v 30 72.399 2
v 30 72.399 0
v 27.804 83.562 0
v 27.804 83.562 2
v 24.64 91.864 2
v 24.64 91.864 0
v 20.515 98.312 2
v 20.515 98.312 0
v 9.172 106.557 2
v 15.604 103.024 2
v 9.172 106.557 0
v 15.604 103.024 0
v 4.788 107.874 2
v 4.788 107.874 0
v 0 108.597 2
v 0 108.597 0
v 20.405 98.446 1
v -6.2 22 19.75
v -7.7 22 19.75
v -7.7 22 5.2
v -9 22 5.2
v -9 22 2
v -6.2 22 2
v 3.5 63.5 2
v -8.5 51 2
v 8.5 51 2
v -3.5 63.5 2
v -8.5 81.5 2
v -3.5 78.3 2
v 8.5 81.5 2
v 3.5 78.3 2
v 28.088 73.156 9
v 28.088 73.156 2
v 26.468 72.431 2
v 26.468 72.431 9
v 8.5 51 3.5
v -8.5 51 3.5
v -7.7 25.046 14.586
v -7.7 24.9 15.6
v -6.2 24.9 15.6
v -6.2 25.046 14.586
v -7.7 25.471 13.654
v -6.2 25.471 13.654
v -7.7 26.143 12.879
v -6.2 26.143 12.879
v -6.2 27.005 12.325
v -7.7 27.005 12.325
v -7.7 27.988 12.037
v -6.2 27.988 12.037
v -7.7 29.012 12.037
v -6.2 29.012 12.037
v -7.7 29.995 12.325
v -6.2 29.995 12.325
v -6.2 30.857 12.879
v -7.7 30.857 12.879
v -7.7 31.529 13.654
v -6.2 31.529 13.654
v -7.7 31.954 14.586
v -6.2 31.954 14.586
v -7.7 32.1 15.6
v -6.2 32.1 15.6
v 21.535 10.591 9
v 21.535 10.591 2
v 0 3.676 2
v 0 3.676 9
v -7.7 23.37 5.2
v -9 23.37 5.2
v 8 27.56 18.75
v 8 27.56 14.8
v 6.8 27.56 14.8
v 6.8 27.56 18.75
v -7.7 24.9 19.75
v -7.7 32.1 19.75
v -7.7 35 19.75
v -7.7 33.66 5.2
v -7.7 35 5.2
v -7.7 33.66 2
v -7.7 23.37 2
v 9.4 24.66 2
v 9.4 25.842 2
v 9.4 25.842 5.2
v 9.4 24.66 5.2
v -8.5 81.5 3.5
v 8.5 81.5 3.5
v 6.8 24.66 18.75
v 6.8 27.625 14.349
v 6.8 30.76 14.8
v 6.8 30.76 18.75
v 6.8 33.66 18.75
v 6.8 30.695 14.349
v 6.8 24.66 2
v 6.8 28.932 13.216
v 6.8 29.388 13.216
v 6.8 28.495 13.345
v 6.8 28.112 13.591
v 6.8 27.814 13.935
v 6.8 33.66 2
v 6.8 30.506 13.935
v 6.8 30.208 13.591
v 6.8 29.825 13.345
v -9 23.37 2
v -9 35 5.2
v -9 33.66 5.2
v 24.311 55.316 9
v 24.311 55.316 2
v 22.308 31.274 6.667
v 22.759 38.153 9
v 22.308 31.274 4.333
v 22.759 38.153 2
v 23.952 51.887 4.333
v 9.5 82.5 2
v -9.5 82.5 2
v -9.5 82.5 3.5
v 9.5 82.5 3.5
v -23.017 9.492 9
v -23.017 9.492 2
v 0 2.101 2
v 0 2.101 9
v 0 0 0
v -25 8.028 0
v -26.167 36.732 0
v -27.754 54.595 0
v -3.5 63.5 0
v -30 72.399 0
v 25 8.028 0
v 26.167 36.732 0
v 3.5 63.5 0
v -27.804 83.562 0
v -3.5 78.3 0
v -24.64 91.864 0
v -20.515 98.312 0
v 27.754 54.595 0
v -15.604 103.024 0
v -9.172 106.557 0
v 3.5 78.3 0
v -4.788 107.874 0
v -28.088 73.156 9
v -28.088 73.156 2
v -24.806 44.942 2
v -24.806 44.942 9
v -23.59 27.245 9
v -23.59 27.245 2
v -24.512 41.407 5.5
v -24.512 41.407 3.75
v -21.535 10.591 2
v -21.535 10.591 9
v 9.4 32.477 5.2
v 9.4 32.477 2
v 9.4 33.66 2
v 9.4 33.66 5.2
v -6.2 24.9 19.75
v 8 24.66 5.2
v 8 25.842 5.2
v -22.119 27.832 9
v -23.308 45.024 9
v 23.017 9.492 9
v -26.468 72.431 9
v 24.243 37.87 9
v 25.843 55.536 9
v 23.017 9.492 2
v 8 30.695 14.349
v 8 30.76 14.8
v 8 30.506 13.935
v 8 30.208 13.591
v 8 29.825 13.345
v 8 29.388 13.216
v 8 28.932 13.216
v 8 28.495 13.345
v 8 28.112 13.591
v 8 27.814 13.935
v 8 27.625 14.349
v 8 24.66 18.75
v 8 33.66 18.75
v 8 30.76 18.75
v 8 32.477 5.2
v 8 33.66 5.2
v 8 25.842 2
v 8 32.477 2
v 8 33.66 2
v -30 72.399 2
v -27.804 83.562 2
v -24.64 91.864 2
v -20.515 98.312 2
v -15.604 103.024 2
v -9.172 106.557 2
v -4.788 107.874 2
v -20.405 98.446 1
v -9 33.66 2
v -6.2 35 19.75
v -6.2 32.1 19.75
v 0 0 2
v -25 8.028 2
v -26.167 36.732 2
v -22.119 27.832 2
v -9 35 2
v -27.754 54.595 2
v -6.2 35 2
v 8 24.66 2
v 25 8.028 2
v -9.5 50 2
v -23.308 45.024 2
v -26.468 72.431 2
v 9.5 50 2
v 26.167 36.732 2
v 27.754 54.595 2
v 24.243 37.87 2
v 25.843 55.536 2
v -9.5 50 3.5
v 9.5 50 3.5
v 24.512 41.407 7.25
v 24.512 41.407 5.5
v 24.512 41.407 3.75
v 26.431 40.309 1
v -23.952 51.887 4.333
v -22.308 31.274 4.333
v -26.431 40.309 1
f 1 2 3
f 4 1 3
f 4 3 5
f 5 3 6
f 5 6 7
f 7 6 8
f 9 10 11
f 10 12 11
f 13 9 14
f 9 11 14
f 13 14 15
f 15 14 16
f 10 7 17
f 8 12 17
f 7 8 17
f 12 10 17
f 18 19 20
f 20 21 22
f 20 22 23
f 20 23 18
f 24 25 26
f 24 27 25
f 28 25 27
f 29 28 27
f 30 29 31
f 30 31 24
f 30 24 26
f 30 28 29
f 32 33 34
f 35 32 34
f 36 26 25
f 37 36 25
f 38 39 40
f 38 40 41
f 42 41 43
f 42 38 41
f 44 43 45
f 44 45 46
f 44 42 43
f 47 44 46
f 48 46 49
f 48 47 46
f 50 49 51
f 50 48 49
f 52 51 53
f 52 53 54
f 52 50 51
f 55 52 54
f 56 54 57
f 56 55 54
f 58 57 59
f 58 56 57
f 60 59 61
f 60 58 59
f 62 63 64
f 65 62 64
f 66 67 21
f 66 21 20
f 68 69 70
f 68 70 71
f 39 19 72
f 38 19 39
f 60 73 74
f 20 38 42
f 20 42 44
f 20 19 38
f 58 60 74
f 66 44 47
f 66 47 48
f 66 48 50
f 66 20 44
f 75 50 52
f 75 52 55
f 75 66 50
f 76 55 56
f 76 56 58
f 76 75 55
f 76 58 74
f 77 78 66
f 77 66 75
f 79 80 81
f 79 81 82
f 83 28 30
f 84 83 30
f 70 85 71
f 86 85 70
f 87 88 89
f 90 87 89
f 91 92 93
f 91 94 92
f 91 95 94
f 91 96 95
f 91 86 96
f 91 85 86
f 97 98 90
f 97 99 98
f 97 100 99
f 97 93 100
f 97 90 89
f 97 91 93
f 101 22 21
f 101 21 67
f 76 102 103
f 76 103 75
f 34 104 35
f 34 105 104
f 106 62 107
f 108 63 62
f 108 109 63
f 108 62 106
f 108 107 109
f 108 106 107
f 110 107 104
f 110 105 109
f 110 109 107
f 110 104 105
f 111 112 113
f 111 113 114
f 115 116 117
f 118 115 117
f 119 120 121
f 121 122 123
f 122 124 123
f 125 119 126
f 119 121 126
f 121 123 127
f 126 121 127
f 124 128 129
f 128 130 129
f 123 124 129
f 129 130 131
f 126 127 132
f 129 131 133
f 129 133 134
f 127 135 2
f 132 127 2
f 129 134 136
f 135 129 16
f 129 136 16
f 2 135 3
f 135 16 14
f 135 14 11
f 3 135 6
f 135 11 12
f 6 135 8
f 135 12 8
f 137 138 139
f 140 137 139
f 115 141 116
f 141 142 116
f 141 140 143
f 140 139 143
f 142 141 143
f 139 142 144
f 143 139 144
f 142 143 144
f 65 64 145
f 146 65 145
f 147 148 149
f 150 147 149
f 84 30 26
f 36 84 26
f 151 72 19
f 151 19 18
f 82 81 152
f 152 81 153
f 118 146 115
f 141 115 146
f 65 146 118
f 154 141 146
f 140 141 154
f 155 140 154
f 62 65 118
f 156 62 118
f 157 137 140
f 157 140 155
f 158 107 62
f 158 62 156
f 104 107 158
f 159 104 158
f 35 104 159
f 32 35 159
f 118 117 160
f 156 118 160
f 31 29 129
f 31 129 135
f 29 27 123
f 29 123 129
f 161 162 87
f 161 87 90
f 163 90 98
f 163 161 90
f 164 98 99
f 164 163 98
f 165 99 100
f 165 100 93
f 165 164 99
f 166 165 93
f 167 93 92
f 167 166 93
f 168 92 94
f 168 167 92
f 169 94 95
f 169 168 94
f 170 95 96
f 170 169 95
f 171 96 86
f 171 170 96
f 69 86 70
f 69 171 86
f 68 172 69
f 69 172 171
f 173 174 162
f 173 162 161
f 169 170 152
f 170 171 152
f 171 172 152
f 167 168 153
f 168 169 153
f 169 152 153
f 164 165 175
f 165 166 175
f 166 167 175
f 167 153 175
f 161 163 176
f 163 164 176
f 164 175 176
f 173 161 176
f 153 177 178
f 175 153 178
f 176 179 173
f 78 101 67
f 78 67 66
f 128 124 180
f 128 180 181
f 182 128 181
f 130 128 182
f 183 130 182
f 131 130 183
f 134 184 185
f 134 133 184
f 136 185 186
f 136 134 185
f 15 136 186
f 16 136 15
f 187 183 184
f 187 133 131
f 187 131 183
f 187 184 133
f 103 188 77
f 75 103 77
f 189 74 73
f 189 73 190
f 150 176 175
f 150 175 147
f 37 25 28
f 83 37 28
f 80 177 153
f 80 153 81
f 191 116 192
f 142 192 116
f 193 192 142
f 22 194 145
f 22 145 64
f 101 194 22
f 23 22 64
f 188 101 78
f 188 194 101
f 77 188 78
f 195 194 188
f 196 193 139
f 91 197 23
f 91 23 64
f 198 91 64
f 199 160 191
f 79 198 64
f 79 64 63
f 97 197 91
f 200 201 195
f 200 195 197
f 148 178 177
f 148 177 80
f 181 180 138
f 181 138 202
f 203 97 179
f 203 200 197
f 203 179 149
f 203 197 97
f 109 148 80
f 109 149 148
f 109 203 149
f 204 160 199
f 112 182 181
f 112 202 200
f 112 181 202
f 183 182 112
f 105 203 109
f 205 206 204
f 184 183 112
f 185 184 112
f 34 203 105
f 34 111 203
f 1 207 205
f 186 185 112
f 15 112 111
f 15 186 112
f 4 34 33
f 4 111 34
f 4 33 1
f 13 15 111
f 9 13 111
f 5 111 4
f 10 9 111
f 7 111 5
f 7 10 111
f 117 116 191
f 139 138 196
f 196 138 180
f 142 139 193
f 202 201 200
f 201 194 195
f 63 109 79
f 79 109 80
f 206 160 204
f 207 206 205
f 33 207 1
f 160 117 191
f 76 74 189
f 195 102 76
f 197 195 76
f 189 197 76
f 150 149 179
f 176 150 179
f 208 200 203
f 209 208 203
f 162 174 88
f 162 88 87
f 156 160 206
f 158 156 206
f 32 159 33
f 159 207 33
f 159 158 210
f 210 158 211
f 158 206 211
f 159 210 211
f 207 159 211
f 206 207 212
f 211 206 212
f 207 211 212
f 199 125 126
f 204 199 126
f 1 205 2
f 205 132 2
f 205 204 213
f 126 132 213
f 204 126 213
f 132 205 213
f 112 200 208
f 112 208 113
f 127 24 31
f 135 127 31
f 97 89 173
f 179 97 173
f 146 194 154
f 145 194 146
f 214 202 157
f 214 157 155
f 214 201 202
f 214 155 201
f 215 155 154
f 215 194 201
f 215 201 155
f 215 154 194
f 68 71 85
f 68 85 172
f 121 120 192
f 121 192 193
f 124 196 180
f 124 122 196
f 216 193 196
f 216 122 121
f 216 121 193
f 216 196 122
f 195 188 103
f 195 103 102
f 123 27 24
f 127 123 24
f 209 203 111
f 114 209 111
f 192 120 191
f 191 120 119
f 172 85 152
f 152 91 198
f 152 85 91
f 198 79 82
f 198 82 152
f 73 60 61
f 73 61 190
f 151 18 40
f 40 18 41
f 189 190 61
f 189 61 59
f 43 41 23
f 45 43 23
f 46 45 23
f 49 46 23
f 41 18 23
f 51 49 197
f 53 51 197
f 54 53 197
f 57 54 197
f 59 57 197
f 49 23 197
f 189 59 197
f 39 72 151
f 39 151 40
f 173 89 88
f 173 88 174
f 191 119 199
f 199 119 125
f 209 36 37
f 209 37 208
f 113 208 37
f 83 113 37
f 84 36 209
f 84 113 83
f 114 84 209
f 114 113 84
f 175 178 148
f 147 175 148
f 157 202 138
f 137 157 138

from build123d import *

# Parameters (mm, degrees)
P_IDAT_VYSUNUT_M3_DEPTH  = 2
SKICA5_W                 = 19
SKICA5_H                 = 32.5
P_IDAT_VYSUNUT_M4_DEPTH  = 1.5
SKICA6_W                 = 1.5
SKICA6_H                 = 13
P_IDAT_VYSUNUT_M5_DEPTH  = 17.75
SKICA6_4_W               = 1.2
SKICA6_4_H               = 9
P_IDAT_VYSUNUT_M6_DEPTH  = 16.75
SKICA9_W                 = 1.3
SKICA9_H                 = 1.369535349
SKICA9_H_2               = 1.34
P_IDAT_VYSUNUT_M7_DEPTH  = 3.2
ODEBRAT_VYSUNUT_M5_DEPTH = 1.2
ODEBRAT_VYSUNUT_M6_DEPTH = 1.5
SKICA13_W                = 7
SKICA13_H                = 14.8
ODEBRAT_VYSUNUT_M7_DEPTH = 2
P_IDAT_VYSUNUT_M9_DEPTH  = 7


with BuildPart() as part:
    # Skica3 → Přidat vysunutím3 (new body)
    with BuildSketch(Plane.XY):
        with BuildLine():
            Line((0, 0), (25, 8.027622297))
            add(Edge.make_bspline(
                [(25, 8.027622297), (25.362983363, 40.405597735), (30, 72.39878495)],
                knots=[0, 0, 0, 1, 1, 1], degree=2))
            add(Edge.make_bspline(
                [(30, 72.39878495), (25.810182082, 106.393156288), (0, 108.597151184)],
                knots=[0, 0, 0, 1, 1, 1], degree=2))
            add(Edge.make_bspline(
                [(-30, 72.39878495), (-25.810182082, 106.393156288), (0, 108.597151184)],
                knots=[0, 0, 0, 1, 1, 1], degree=2))
            add(Edge.make_bspline(
                [(-25, 8.027622297), (-25.362983363, 40.405597735), (-30, 72.39878495)],
                knots=[0, 0, 0, 1, 1, 1], degree=2))
            Line((-25, 8.027622297), (0, 0))
        make_face()
    extrude(amount=P_IDAT_VYSUNUT_M3_DEPTH)

    # Skica5 → Přidat vysunutím4 (add)
    with BuildSketch(Plane.XY.offset(2)):
        with Locations((0, 66.25)):
            Rectangle(SKICA5_W, SKICA5_H)
        Polygon((-8.5, 81.5), (8.5, 81.5), (8.5, 51), (0, 51), (-8.5, 51), align=None, mode=Mode.SUBTRACT)
    extrude(amount=P_IDAT_VYSUNUT_M4_DEPTH)

    # Skica6 → Přidat vysunutím5 (add)
    with BuildSketch(Plane.XY.offset(2)):
        with Locations((-6.95, 28.5)):
            Rectangle(SKICA6_W, SKICA6_H)
    extrude(amount=P_IDAT_VYSUNUT_M5_DEPTH)

    # Skica6<4> → Přidat vysunutím6 (add)
    with BuildSketch(Plane.XY.offset(2)):
        with Locations((7.4, 29.16)):
            Rectangle(SKICA6_4_W, SKICA6_4_H)
    extrude(amount=P_IDAT_VYSUNUT_M6_DEPTH)

    # Skica9 → Přidat vysunutím7 (add)
    with BuildSketch(Plane.XY.offset(2)):
        Polygon((8, 33.659998668), (8, 32.477114588), (9.4, 32.477114544), (9.4, 33.659998668), align=None)
        Polygon((8, 24.659998668), (8, 25.841591632), (9.399999793, 25.841591589), (9.399999793, 24.659998668), align=None)
        with Locations((-8.35, 22.684767675)):
            Rectangle(SKICA9_W, SKICA9_H)
        with Locations((-8.35, 34.33)):
            Rectangle(SKICA9_W, SKICA9_H_2)
    extrude(amount=P_IDAT_VYSUNUT_M7_DEPTH)

    # Skica11 → Odebrat vysunutím5 (cut)
    with BuildSketch(Plane(origin=(8, 0, 0), x_dir=(0, 0, -1), z_dir=(1, 0, 0))):
        with BuildLine():
            Line((-18.75, 27.56), (-18.75, 30.76))
            Line((-18.75, 30.76), (-14.8, 30.76))
            ThreePointArc((-14.8, 30.76), (-13.2, 29.16), (-14.8, 27.56))
            Line((-14.8, 27.56), (-18.75, 27.56))
        make_face()
    extrude(amount=-ODEBRAT_VYSUNUT_M5_DEPTH, mode=Mode.SUBTRACT)

    # Skica12 → Odebrat vysunutím6 (cut)
    with BuildSketch(Plane.ZY.offset(7.7)):
        with BuildLine():
            Line((19.75, 32.1), (19.75, 24.9))
            Line((19.75, 24.9), (15.6, 24.9))
            ThreePointArc((15.6, 24.9), (12, 28.5), (15.6, 32.1))
            Line((15.6, 32.1), (19.75, 32.1))
        make_face()
    extrude(amount=-ODEBRAT_VYSUNUT_M6_DEPTH, mode=Mode.SUBTRACT)

    # Skica13 → Odebrat vysunutím7 (cut)
    with BuildSketch(Plane.XY.offset(2)):
        with Locations((0, 70.9)):
            Rectangle(SKICA13_W, SKICA13_H)
    extrude(amount=-ODEBRAT_VYSUNUT_M7_DEPTH, mode=Mode.SUBTRACT)

    # Skica15 → Přidat vysunutím9 (add)
    with BuildSketch(Plane.XY.offset(2)):
        with BuildLine():
            Line((-23.017222129, 9.491521925), (0, 2.100579303))
            Line((0, 2.100579303), (23.017222129, 9.491521925))
            add(Edge.make_bspline(
                [(23.017222129, 9.491521925), (23.104228084, 14.820015615), (23.412919749, 25.481851116), (24.427384602, 41.413676681), (25.947336757, 57.30526528), (27.328834525, 67.881140695), (28.08811969, 73.155746738)],
                knots=[-0.017295959, -0.017295959, -0.017295959, -0.017295959, 0.240841414, 0.498978787, 0.75711616, 1.015253532, 1.015253532, 1.015253532, 1.015253532], degree=3))
            Line((28.08811969, 73.155746738), (26.468325097, 72.43096677))
            add(Edge.make_bspline(
                [(21.534974927, 10.590999575), (21.873259628, 31.308522725), (23.516034404, 51.921978771), (26.468325097, 72.43096677)],
                knots=[0, 0, 0, 0, 1, 1, 1, 1], degree=3))
            Line((21.534974927, 10.590999575), (0, 3.676013779))
            Line((0, 3.676013779), (-21.534974927, 10.590999575))
            add(Edge.make_bspline(
                [(-26.468325097, 72.43096677), (-23.516034403, 51.921978771), (-21.873259627, 31.308522725), (-21.534974927, 10.590999575)],
                knots=[0, 0, 0, 0, 1, 1, 1, 1], degree=3))
            Line((-26.468325097, 72.43096677), (-28.08811969, 73.15574674))
            add(Edge.make_bspline(
                [(-28.08811969, 73.15574674), (-27.328834525, 67.881140697), (-25.947336757, 57.305265281), (-24.427384601, 41.413676681), (-23.412919749, 25.481851116), (-23.104228084, 14.820015615), (-23.017222129, 9.491521925)],
                knots=[-0.015253532, -0.015253532, -0.015253532, -0.015253532, 0.24288384, 0.501021213, 0.759158586, 1.017295959, 1.017295959, 1.017295959, 1.017295959], degree=3))
        make_face()
    extrude(amount=P_IDAT_VYSUNUT_M9_DEPTH)


solid = part.part
